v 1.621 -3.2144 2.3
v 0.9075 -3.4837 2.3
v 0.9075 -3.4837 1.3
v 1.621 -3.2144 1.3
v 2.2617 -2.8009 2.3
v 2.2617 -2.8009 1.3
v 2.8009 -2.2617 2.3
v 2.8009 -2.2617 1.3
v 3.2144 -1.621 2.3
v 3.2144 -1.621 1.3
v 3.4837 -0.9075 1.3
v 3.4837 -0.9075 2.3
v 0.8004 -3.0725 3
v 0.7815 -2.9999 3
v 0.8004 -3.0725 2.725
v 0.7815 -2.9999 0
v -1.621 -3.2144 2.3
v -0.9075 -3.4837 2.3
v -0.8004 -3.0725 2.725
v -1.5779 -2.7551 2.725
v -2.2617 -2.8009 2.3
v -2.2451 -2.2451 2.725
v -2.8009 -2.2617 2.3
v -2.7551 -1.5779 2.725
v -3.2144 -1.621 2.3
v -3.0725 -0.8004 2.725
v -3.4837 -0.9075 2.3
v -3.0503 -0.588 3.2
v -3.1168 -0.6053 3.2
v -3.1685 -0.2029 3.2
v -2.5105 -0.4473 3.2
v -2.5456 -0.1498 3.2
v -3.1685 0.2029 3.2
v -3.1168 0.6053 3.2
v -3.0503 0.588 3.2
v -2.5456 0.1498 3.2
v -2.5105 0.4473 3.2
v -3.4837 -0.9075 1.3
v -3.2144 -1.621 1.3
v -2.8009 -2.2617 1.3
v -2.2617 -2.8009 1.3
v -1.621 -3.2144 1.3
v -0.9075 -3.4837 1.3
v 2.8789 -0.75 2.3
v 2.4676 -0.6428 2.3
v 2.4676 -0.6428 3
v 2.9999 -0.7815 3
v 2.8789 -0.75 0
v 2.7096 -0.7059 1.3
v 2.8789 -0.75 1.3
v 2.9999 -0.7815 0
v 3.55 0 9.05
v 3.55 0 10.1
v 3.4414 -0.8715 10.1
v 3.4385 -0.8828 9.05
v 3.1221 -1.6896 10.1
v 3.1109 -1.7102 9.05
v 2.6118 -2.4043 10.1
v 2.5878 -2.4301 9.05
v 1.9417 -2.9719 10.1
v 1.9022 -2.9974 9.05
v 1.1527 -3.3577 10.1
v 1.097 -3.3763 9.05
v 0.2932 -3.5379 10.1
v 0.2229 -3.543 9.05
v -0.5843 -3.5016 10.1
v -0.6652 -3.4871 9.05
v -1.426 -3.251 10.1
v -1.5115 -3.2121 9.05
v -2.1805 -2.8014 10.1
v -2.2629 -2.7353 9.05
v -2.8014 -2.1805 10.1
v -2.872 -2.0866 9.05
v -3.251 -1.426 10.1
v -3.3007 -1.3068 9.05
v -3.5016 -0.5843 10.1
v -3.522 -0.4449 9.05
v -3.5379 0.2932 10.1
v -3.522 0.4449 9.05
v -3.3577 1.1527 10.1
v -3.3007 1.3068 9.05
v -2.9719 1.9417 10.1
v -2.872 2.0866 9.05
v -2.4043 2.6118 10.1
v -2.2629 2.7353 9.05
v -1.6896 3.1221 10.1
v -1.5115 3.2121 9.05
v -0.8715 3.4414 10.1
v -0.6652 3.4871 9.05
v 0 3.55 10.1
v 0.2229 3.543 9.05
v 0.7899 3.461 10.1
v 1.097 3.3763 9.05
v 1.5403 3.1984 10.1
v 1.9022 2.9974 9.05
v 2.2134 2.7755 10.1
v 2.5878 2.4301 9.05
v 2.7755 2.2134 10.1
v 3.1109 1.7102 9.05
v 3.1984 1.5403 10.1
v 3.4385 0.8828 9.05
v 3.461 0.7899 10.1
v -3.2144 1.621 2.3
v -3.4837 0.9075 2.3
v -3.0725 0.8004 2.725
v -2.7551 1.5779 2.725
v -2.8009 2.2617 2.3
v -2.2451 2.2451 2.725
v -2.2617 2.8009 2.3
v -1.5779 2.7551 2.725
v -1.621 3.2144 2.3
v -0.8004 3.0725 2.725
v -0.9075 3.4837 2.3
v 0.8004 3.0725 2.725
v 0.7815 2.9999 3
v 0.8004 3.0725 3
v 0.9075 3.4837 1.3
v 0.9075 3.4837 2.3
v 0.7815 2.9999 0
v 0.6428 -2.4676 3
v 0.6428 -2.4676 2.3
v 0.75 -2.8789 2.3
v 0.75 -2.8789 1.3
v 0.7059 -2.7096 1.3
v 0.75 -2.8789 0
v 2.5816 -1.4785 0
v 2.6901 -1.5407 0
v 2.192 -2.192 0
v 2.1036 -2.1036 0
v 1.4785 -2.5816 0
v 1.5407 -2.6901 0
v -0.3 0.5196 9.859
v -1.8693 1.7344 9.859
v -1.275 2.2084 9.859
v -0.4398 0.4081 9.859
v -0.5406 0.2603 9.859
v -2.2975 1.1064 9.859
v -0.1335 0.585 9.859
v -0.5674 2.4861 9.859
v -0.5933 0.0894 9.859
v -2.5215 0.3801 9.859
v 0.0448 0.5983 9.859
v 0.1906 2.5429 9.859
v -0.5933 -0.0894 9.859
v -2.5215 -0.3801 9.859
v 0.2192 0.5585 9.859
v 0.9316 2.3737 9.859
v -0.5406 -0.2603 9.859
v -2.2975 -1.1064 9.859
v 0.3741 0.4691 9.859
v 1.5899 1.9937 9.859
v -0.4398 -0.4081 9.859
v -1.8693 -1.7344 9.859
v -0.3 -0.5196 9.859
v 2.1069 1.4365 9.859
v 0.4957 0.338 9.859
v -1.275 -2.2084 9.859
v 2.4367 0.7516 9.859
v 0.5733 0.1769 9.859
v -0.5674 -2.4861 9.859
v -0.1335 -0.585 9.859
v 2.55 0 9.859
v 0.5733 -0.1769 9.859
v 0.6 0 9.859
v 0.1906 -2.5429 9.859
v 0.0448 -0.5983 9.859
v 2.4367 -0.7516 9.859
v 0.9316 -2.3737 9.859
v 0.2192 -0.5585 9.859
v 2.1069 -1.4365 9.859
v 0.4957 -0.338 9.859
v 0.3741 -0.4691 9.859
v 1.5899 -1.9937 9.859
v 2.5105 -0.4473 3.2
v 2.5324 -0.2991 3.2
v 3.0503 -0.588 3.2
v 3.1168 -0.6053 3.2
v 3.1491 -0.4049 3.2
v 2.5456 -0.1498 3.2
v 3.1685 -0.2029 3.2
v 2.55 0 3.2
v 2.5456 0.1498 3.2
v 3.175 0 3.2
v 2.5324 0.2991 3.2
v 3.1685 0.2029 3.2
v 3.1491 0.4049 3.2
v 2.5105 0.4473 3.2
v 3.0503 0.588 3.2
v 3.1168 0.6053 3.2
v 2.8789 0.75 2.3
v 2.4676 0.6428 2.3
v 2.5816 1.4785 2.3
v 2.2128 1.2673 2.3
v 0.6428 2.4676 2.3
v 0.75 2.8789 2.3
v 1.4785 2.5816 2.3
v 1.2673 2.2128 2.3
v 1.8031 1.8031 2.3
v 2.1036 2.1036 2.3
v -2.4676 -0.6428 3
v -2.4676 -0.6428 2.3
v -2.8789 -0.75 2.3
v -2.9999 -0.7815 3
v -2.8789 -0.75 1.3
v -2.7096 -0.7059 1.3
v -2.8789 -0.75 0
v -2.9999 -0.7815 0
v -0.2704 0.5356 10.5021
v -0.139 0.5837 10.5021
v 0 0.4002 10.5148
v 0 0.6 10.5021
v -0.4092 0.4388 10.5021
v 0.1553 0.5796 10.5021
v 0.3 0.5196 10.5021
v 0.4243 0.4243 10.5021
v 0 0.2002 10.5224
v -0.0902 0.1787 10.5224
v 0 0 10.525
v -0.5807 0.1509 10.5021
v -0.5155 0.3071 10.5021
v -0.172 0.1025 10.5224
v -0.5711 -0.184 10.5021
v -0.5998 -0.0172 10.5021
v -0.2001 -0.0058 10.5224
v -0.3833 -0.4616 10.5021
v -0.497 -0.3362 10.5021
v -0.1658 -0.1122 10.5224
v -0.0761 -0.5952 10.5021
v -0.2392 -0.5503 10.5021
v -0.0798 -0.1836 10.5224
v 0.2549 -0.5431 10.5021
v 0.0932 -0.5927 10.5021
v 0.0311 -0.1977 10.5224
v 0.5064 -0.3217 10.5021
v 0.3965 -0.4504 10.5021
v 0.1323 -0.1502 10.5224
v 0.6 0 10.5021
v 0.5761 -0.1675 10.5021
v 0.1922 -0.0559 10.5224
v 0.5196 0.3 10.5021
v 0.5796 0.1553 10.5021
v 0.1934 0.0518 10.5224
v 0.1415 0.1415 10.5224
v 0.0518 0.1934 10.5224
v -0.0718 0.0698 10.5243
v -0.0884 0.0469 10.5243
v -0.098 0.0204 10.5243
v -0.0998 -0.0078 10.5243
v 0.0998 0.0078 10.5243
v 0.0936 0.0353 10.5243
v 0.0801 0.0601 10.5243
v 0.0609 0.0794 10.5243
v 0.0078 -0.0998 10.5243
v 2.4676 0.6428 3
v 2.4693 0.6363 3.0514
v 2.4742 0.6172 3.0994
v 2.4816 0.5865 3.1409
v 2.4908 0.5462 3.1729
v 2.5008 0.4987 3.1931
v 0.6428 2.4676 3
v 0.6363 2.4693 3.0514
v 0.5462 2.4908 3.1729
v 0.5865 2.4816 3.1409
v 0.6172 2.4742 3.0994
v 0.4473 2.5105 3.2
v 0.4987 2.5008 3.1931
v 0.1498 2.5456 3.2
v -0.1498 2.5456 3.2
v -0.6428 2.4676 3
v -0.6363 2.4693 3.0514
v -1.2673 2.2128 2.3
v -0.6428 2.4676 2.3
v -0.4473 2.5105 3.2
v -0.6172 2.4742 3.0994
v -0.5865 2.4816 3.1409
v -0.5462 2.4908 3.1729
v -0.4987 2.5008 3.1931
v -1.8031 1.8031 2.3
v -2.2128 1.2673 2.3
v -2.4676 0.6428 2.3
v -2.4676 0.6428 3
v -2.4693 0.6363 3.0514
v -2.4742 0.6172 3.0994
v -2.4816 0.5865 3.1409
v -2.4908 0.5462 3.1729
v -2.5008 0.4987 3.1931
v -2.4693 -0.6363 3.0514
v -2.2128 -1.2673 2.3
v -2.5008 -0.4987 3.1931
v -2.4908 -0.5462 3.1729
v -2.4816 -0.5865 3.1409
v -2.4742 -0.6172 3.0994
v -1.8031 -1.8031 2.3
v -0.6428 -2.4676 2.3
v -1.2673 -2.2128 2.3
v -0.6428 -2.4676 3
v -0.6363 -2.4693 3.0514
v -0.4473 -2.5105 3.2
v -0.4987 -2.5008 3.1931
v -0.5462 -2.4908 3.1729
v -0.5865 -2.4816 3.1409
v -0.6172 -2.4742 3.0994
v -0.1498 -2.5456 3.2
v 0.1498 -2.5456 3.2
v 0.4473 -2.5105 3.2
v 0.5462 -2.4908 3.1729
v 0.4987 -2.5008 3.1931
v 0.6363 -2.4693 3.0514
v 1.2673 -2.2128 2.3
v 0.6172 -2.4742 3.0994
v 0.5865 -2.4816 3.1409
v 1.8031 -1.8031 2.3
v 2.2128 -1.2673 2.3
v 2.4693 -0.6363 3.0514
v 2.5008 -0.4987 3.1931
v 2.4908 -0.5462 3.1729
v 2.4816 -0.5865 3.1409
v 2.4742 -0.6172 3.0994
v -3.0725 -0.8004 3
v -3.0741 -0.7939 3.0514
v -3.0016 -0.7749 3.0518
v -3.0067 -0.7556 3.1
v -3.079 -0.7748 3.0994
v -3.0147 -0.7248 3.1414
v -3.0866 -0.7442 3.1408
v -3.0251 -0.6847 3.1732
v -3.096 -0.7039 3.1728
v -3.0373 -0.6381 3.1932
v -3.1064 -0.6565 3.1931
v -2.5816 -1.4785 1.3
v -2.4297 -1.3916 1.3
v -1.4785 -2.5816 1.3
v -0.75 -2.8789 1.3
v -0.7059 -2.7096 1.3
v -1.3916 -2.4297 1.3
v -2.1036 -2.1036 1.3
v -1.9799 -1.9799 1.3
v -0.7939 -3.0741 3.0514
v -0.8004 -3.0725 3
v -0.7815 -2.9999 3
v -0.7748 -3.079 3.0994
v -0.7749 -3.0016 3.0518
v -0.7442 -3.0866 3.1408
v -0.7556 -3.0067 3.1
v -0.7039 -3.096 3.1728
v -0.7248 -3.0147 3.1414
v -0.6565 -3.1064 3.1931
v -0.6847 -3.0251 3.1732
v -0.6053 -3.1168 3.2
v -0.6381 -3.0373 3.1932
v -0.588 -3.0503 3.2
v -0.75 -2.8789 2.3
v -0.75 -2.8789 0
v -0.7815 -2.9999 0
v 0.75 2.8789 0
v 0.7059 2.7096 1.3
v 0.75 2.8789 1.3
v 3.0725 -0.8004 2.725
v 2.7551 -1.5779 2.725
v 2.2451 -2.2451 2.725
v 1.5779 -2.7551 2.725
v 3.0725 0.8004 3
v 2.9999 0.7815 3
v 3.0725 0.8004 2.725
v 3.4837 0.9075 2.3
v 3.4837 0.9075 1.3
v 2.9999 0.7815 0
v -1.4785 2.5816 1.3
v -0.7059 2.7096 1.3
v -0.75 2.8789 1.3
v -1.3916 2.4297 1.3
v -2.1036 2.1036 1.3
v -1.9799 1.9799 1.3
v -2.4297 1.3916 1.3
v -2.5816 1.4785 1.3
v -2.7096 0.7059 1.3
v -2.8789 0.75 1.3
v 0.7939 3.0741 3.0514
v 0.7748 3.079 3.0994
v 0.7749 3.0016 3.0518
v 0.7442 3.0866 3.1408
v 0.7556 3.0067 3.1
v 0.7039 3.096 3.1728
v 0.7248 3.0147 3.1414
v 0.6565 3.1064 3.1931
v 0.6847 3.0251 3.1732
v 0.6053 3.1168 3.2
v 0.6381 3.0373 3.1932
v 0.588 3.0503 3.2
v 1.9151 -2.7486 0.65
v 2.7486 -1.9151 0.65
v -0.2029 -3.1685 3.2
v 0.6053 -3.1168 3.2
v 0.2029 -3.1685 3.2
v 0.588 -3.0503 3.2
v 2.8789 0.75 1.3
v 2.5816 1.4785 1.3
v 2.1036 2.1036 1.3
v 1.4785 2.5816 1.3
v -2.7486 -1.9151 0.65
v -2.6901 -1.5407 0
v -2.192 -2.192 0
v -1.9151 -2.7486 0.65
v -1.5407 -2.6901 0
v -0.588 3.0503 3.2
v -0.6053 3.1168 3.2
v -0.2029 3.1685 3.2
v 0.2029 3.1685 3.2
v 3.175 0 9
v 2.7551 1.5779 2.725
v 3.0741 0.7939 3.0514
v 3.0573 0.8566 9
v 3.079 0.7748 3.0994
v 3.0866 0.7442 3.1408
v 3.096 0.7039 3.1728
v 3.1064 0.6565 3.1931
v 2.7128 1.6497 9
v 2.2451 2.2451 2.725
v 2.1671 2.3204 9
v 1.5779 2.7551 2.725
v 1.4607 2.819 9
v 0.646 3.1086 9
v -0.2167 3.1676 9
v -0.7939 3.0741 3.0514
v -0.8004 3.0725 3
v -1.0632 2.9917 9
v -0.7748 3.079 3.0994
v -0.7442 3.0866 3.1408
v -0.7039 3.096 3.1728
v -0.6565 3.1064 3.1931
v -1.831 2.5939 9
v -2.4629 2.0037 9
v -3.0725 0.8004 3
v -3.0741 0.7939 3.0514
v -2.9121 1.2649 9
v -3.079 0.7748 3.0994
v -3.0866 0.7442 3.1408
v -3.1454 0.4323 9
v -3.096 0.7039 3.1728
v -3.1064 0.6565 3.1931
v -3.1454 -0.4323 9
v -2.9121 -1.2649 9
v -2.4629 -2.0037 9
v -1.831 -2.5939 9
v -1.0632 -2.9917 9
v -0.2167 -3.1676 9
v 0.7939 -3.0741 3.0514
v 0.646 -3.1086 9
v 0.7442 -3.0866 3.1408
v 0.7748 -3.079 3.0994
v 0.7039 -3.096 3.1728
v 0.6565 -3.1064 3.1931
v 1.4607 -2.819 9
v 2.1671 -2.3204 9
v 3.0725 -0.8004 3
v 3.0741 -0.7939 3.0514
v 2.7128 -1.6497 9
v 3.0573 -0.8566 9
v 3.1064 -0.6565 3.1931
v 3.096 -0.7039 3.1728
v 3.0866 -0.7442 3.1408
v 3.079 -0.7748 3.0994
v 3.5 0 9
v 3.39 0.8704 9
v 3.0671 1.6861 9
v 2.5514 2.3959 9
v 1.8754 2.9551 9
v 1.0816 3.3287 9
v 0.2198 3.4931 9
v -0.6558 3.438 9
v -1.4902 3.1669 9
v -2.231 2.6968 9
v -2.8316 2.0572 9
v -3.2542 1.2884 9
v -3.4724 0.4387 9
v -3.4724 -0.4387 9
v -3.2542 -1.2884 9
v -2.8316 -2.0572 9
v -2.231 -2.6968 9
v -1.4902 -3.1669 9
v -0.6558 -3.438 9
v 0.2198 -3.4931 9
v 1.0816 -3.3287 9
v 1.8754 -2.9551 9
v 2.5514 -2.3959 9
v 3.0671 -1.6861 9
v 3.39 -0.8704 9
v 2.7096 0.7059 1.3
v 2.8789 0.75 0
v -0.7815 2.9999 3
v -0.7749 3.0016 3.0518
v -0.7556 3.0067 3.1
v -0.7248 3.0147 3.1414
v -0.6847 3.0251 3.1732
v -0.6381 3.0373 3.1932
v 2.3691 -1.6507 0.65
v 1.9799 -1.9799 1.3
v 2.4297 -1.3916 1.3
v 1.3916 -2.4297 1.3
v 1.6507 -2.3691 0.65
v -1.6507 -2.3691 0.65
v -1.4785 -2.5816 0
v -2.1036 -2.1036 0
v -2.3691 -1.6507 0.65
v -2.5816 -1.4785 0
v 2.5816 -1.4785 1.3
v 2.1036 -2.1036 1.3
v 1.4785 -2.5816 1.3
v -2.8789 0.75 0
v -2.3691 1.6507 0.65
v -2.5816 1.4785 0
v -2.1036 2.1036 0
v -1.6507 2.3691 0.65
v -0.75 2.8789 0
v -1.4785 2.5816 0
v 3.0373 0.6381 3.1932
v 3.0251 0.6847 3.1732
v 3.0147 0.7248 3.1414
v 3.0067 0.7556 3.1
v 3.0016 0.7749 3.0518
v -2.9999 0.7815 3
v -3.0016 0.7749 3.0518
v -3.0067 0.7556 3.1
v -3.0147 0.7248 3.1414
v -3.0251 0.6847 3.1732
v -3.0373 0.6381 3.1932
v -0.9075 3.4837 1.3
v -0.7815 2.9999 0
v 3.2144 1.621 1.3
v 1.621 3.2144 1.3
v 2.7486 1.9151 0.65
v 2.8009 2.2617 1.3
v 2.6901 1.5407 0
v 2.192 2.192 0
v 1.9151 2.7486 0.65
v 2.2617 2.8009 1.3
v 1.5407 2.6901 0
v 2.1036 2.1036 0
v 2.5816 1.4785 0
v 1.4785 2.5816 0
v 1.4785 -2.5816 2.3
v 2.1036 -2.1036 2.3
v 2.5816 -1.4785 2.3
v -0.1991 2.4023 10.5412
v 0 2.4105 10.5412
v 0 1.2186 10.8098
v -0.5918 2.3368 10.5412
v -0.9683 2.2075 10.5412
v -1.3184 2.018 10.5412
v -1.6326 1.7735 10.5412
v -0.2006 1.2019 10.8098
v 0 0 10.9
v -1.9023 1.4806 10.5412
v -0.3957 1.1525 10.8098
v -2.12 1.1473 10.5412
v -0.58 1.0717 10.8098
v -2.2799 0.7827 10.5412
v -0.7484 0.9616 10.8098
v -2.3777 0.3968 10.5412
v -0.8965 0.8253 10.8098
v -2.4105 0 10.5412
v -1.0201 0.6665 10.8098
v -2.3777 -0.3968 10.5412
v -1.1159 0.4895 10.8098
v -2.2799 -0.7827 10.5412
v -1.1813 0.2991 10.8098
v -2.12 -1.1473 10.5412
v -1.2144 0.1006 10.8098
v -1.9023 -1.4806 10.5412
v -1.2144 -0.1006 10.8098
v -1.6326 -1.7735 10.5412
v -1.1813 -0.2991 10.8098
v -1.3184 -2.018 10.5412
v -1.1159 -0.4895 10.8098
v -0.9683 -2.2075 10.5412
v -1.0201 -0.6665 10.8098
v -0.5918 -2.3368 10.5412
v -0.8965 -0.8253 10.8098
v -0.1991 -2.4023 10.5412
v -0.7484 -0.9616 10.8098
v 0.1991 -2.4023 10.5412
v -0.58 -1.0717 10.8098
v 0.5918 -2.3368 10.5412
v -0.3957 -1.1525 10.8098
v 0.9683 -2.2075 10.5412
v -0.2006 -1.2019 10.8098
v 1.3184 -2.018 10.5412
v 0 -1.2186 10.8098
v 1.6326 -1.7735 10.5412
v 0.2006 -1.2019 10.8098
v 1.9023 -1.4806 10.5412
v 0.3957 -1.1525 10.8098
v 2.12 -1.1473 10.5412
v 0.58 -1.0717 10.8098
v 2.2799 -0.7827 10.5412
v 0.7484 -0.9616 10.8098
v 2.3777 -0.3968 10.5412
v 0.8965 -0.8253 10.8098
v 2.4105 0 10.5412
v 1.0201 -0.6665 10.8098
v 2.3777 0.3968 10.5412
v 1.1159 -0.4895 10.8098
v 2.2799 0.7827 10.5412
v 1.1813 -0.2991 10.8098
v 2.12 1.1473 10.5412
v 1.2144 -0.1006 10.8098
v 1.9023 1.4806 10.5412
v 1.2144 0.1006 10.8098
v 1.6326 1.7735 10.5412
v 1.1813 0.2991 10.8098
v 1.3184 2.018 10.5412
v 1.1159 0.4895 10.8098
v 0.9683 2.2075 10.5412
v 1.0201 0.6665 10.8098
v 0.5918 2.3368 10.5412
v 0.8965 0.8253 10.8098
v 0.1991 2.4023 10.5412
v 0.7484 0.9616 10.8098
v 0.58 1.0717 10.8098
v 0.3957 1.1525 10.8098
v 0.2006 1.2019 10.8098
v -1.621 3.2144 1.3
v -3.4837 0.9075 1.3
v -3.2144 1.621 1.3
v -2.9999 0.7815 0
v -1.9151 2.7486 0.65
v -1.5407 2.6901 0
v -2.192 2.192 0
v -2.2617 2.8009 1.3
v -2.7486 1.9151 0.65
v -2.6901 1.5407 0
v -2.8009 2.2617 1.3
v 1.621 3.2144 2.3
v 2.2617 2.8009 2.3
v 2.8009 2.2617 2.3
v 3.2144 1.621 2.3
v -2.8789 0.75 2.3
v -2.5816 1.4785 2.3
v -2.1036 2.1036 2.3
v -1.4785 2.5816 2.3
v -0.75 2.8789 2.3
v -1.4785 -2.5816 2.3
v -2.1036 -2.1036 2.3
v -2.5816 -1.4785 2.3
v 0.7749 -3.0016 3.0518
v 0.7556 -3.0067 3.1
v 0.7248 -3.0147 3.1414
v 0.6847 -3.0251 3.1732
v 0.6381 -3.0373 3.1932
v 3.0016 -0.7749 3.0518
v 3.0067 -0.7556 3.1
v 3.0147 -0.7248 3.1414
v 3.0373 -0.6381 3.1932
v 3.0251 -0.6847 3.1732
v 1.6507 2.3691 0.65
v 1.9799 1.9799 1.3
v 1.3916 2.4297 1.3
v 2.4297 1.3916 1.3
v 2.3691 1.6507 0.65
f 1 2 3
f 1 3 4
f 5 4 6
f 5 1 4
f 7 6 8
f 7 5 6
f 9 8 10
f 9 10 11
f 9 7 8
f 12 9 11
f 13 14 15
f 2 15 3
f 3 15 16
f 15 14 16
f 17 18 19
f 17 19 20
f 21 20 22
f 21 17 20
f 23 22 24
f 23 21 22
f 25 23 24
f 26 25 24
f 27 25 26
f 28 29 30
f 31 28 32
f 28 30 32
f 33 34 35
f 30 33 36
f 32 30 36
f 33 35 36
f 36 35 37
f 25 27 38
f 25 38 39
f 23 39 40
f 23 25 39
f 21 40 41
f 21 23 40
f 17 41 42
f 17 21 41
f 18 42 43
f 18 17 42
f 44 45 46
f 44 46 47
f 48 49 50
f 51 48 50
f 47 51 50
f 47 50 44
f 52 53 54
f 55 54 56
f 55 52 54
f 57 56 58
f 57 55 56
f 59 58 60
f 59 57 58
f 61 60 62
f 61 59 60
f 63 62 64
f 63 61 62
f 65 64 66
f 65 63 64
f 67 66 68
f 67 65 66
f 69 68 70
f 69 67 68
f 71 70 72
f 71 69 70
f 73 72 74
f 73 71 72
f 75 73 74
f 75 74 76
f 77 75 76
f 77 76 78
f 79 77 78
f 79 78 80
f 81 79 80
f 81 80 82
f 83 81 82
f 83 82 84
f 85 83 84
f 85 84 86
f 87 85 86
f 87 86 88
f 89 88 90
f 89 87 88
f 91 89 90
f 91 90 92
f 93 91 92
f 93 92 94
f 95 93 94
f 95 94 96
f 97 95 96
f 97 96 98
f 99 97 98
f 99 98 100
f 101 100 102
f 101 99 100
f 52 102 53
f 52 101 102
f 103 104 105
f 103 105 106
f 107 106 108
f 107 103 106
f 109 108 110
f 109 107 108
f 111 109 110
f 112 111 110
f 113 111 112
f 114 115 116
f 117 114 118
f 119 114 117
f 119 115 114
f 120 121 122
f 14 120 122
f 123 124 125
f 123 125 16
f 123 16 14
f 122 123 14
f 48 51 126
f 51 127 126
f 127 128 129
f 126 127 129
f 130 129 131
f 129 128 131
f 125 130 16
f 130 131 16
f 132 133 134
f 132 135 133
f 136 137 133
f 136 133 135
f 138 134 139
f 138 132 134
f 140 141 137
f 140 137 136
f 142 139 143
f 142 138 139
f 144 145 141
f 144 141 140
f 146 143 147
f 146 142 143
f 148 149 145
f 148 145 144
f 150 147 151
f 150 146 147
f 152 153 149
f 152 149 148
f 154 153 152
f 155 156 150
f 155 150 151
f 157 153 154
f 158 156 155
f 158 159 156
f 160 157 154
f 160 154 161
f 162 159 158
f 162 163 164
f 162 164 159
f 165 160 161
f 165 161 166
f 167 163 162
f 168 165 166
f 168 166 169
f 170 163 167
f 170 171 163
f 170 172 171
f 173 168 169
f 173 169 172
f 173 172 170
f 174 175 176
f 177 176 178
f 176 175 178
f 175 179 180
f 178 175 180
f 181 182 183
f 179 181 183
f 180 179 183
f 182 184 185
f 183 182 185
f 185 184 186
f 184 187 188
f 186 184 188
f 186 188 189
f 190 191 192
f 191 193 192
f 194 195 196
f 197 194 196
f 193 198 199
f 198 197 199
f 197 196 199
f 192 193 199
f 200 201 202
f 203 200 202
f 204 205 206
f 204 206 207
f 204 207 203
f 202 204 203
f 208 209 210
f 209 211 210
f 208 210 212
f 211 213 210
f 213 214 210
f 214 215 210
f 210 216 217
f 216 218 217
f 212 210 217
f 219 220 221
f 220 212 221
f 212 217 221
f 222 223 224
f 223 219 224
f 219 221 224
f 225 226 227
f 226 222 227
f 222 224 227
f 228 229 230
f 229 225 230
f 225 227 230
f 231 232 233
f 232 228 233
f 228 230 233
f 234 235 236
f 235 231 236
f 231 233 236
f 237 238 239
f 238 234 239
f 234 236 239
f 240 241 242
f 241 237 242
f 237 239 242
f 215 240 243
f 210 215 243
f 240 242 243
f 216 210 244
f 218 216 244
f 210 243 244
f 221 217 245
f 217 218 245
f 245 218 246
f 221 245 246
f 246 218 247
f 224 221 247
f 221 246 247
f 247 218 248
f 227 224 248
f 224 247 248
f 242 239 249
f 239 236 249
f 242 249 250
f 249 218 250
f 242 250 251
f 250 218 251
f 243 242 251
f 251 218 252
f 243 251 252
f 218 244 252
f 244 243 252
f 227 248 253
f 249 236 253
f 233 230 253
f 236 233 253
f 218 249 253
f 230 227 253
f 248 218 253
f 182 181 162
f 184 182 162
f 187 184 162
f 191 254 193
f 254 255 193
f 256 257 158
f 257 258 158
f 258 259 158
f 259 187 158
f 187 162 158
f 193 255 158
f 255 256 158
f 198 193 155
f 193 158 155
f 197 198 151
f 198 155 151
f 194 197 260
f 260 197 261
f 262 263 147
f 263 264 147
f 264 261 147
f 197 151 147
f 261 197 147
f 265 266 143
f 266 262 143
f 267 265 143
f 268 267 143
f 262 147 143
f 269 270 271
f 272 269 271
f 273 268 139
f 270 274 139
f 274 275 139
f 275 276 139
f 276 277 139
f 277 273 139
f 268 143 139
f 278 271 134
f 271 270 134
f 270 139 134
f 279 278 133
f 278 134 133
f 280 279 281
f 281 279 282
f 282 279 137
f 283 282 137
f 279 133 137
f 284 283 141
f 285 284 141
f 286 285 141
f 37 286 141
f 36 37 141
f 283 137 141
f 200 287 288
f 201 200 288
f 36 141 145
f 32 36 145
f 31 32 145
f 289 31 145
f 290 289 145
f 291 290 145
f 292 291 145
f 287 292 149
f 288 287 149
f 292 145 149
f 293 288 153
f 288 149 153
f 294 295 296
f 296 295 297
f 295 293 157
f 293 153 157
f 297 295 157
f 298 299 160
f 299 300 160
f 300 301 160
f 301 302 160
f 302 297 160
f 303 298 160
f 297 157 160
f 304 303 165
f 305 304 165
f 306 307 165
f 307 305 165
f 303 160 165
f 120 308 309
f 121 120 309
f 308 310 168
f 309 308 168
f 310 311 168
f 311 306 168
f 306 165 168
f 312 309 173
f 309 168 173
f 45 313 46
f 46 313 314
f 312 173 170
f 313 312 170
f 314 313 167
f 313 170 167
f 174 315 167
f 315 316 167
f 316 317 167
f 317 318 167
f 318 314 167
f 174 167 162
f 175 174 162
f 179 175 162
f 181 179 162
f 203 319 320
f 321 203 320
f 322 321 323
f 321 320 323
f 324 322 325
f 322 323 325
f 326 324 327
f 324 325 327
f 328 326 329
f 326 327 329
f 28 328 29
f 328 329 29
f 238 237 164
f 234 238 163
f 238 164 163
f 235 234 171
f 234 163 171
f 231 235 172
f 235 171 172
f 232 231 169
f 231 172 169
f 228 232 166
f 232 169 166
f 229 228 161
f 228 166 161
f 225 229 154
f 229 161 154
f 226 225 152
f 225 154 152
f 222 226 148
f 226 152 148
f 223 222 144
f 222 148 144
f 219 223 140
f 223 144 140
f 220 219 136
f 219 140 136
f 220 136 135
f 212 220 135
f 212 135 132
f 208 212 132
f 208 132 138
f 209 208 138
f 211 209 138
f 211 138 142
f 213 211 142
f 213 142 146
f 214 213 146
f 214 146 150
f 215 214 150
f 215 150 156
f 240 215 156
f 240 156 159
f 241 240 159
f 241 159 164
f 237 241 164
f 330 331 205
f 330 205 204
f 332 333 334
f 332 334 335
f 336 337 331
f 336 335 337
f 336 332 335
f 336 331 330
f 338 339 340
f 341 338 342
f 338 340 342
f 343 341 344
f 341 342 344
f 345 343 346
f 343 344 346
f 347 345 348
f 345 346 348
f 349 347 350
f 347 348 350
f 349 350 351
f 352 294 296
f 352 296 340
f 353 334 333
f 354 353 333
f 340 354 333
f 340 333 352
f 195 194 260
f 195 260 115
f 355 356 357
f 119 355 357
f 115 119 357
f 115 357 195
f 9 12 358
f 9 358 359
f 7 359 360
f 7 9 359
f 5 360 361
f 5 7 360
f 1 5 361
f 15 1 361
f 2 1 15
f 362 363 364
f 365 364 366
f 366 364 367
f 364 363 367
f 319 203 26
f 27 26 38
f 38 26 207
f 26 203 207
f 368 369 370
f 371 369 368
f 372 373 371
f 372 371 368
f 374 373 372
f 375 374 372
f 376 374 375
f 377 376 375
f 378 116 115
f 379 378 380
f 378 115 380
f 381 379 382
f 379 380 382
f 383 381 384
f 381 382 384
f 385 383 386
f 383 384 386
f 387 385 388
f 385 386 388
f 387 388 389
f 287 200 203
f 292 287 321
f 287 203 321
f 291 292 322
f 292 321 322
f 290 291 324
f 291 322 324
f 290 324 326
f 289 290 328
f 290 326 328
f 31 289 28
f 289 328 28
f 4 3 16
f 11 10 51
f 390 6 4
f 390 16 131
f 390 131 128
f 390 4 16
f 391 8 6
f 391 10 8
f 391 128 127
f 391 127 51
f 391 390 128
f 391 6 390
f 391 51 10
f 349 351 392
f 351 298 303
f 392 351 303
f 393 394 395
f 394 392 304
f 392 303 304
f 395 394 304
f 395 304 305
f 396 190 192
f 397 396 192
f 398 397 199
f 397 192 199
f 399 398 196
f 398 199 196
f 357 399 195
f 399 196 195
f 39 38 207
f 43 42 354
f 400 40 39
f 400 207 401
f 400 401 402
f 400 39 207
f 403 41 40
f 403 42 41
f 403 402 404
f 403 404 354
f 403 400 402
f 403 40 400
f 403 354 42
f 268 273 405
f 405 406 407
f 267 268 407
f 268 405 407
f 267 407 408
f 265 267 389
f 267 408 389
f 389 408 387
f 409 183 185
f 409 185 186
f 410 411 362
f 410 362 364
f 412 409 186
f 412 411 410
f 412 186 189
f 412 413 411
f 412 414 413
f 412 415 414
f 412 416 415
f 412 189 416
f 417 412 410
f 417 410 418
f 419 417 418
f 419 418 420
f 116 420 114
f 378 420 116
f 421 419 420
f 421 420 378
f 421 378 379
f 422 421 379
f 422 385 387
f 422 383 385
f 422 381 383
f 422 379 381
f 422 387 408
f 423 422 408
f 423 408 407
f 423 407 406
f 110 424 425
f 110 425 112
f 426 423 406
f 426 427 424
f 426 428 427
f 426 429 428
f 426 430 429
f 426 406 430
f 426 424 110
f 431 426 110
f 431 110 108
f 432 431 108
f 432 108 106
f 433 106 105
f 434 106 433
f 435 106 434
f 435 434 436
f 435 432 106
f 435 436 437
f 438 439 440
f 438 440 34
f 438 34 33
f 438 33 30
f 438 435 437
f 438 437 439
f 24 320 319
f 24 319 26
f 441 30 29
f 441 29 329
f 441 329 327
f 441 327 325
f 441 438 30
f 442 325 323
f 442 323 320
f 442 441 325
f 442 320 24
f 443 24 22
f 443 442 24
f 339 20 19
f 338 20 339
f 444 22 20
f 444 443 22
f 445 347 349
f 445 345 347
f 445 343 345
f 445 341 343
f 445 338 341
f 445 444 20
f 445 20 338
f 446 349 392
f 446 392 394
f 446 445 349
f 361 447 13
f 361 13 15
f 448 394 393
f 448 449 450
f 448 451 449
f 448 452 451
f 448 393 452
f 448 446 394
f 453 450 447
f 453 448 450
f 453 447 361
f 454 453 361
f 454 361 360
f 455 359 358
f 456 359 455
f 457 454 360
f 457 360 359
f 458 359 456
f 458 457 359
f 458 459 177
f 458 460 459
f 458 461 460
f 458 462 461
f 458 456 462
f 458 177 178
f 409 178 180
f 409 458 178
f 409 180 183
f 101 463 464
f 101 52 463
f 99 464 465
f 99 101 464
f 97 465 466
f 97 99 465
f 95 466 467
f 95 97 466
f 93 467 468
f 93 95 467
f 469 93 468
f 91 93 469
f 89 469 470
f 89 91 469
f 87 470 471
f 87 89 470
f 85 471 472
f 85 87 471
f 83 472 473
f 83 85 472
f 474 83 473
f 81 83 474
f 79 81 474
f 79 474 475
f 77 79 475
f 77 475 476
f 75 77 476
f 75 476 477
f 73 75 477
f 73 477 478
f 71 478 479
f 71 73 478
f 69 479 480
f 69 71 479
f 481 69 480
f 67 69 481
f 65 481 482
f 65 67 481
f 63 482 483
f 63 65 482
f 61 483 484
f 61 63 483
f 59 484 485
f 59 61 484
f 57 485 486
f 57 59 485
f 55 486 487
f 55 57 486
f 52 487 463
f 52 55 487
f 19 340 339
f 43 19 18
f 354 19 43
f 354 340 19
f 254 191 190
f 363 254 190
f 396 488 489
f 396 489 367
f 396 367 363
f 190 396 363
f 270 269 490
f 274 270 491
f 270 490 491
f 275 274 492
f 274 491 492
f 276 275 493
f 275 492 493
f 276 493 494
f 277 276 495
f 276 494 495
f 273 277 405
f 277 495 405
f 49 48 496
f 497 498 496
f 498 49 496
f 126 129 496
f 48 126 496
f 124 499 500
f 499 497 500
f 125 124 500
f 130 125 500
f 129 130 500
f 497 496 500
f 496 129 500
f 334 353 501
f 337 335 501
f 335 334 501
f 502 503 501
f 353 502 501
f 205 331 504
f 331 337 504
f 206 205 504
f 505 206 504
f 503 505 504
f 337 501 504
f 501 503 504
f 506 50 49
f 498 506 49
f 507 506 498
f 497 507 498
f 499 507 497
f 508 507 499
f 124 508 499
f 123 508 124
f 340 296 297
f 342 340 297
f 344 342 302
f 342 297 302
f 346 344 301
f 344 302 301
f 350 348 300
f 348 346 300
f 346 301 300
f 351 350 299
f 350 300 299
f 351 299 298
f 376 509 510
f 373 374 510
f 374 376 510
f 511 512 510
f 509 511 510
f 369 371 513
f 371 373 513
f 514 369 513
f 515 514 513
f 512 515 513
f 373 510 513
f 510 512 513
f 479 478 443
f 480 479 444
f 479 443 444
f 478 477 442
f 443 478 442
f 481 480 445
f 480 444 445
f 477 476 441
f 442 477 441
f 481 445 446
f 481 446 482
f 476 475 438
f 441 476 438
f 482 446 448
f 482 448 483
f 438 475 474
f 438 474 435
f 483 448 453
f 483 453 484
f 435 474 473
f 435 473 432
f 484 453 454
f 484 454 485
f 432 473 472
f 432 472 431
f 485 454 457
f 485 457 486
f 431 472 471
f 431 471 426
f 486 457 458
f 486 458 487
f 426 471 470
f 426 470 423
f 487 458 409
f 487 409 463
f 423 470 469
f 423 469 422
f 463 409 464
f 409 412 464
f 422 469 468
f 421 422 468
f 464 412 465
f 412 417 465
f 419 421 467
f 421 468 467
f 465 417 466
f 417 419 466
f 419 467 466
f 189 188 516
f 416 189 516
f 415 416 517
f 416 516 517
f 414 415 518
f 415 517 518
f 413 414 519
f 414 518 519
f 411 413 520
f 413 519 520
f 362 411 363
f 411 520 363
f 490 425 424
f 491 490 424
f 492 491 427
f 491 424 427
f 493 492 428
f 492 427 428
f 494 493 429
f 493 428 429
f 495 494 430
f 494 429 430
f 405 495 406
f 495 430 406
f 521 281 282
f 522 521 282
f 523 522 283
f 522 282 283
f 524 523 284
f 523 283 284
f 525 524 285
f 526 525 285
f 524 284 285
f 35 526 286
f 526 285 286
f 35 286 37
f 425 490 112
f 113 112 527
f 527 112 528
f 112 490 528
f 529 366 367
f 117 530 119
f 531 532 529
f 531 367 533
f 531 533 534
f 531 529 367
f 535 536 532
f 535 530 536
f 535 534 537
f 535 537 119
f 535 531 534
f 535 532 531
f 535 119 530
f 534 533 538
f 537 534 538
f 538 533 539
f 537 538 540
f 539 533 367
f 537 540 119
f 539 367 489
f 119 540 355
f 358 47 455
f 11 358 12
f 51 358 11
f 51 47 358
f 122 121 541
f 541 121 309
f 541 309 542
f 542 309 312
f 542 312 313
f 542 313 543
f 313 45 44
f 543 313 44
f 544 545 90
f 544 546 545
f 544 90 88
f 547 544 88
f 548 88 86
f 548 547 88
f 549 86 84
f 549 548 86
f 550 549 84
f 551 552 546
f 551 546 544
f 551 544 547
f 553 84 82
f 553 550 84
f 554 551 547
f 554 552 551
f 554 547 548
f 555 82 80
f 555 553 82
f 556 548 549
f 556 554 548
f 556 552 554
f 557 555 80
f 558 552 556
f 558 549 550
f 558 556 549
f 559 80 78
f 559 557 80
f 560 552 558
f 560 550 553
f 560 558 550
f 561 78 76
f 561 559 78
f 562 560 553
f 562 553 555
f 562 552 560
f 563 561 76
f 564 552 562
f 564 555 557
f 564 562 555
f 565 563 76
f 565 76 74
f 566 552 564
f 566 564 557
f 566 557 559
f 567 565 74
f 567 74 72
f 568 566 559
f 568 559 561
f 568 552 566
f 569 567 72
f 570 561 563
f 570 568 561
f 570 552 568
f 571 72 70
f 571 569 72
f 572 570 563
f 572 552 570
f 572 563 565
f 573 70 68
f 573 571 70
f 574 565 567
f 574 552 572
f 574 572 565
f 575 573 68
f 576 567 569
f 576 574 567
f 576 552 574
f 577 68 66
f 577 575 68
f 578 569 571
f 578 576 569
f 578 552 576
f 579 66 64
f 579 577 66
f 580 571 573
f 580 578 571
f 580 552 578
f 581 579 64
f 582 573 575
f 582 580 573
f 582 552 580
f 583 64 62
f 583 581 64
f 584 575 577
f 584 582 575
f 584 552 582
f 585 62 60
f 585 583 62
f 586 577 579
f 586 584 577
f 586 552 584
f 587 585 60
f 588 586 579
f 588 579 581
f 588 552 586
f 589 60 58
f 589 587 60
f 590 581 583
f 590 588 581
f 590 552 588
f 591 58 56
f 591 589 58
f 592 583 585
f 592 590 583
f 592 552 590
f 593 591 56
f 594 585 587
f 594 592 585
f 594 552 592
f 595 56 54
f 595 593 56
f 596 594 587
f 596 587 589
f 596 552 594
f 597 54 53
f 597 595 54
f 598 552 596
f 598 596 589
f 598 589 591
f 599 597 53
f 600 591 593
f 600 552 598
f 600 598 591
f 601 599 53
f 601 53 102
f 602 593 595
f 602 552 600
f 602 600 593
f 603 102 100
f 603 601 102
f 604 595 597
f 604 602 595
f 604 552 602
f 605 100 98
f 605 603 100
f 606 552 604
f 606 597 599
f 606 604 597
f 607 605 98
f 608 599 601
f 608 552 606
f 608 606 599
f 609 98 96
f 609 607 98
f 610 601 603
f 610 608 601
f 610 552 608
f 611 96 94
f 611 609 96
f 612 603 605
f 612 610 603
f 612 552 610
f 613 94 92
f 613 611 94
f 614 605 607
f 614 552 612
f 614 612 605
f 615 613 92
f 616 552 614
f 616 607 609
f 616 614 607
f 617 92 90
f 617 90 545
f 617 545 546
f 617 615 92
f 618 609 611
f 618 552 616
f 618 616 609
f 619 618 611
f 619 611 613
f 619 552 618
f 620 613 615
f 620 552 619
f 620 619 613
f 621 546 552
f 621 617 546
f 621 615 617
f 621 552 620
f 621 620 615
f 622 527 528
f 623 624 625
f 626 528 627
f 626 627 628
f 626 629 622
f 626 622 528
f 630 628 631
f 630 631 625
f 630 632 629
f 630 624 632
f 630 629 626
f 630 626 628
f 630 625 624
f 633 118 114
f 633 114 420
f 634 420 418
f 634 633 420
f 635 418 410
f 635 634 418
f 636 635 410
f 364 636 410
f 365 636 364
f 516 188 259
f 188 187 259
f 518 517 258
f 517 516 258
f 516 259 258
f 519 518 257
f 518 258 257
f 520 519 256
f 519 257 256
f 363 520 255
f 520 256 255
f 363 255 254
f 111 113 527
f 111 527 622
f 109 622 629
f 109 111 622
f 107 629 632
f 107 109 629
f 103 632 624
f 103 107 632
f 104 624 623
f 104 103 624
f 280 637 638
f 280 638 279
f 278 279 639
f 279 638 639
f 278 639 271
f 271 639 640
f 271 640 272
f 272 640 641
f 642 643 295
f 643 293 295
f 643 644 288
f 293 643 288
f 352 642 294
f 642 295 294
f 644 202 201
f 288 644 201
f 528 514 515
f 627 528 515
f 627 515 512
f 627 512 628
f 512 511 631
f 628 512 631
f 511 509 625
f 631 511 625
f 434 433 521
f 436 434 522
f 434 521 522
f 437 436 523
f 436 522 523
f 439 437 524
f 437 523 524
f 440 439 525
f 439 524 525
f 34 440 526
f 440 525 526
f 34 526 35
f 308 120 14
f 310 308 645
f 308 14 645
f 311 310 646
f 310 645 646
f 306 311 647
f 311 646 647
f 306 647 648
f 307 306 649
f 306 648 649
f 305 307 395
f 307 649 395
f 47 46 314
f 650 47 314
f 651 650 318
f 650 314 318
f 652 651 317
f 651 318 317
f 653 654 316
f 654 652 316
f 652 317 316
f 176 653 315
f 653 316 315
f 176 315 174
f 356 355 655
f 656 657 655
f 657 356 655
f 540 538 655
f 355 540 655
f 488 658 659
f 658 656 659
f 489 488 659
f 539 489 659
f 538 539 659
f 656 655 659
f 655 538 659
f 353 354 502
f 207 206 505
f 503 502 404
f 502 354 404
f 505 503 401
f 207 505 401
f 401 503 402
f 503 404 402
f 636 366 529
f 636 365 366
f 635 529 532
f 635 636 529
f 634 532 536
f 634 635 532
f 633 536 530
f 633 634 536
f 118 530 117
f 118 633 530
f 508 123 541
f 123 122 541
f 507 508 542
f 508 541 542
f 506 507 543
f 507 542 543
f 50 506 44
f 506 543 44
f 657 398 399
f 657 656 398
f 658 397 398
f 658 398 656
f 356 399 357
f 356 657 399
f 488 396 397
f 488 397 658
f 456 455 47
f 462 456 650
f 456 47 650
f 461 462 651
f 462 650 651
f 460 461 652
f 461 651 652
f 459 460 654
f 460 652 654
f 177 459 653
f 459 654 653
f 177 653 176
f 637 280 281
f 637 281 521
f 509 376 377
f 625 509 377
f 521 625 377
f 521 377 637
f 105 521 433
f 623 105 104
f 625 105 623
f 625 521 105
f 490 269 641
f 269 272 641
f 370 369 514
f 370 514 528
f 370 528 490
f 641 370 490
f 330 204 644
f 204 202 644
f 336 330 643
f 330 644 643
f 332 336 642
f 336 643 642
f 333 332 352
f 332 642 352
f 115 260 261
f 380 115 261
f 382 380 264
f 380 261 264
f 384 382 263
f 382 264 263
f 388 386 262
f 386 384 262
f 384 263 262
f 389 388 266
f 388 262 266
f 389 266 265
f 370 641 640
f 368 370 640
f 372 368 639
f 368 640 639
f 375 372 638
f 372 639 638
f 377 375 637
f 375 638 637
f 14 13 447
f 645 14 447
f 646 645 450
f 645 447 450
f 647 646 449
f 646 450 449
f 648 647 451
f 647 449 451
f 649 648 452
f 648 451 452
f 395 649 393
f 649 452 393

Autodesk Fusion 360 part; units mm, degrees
ref_plane "WorkPlane1" through (0, 0, 9) normal (0, 0, 1) x (1, 0, 0)
sketch "Sketch2" plane through (0, 0, 9) normal (0, 0, 1) x (1, 0, 0)
  circle A0 centre (0, 0) radius 3.55
  circle A1 centre (0, 0) radius 3.175
  circle A2 centre (0, 0) radius 2.55
  dimension "d2" = 7.1
  dimension "d3" = 6.35
  dimension "d25" = 5.1
extrude "Extrude1" add sketch "Sketch2" along normal blind 1.1 contours A0
sketch "Sketch4" plane through (0, 0, 0) normal (1, 0, 0) x (0, 1, 0)
  line L0 (0, 10.1) -> (0, 10.9) construction
  arc A0 (3.55, 10.1) -> (-3.55, 10.1) centre (0, 2.6234) ccw
  arc A1 (3.175, 9.859) -> (-3.3892, 9.7612) centre (0, 2.6234) ccw
  line L1 (-3.175, 10.1) -> (3.175, 10.1) construction
  line L2 (3.175, 10.1) -> (3.175, 9.859)
  line L3 (0, 10.9) -> (0, 10.525)
  line L4 (3.175, 10.1) -> (3.55, 10.1)
  dimension "d8" = 0.8
revolve "Revolve1" add sketch "Sketch4" angle 360 about axis through (0, 0, 10.1) along (0, 0, 1)
extrude "Extrude6" add sketch "Sketch2" along normal up to surface contours A1 end surface at (-0.7353, 2.2055, 10.1753)
ref_plane "WorkPlane2" through (0, 0, 9.859) normal (0, 0, -1) x (-1, 0, 0)
sketch "Sketch5" plane through (0, 0, 9.859) normal (0, 0, -1) x (1, 0, 0)
  circle A0 centre (0, 0) radius 3.175
  circle A1 centre (0, 0) radius 2.1
  circle A2 centre (0, 0) radius 1.1
  circle A3 centre (0, 0) radius 0.6
  dimension "d11" = 4.2
  dimension "d12" = 2.2
  dimension "d13" = 1.2
extrude "Extrude3" add sketch "Sketch5" along normal up to surface contours A0 end surface at (-0.5875, 1.7623, 10.3035)
extrude "Extrude4" add sketch "Sketch5" along normal up to surface and the other way blind 0.2 contours A1 end surface at (-0.4825, 1.4472, 10.3763)
extrude "Extrude5" add sketch "Sketch5" along normal up to surface and the other way blind 0.4 contours A2 end surface at (-0.252, 0.4204, 10.5098)
ref_plane "WorkPlane3" through (0, 0, 2.3) normal (0, 0, -1) x (-1, 0, 0)
extrude "Extrude7" add sketch "Sketch2" against normal up to surface (6.7 mm away) contours A1
sketch "Sketch7" plane through (0, 0, 0) normal (0, 1, 0) x (1, 0, 0)
  line L0 (0, 0) -> (-2.975, 0) construction
  line L1 (0, 0) -> (-2.8, 0) construction
  line L2 (0, 0) -> (-3.1, 0) construction
  line L3 (0, 0) -> (-3.6, 0) construction
  line L4 (-2.8, 0) -> (-2.8, -1.3) construction
  line L5 (-2.8, -1.3) -> (-2.975, 0)
  line L6 (-2.975, 0) -> (-3.1, 0)
  line L7 (-2.975, 0) -> (-2.975, -1.3) construction
  line L8 (-2.975, -1.3) -> (-2.8, -1.3)
  line L9 (-3.6, 0) -> (-3.6, -1.3) construction
  line L10 (-3.1, 0) -> (-3.6, -1.3)
  line L11 (-3.175, -2.3) -> (3.175, -2.3)
  line L12 (0, -2.3) -> (-2.55, -2.3) construction
  line L13 (-2.975, -1.3) -> (-2.975, -2.3)
  line L14 (-3.175, -2.3) -> (-3.6677, -2.3) construction
  line L15 (-3.6, -1.3) -> (-3.6, -2.3)
  line L16 (-3.6, -2.3) -> (-3.175, -2.725)
  line L17 (-3.175, -2.3) -> (3.175, -2.3)
  line L18 (-3.55, -9) -> (-3.175, -9)
  line L19 (3.175, -9) -> (3.55, -9)
  line L20 (3.175, -9) -> (3.175, -2.3)
  line L21 (-3.175, -9) -> (-3.175, -2.3)
  arc A0 (-3.55, -10.1) -> (3.55, -10.1) centre (0, -2.6234) ccw
  line L22 (-3.55, -9) -> (-3.55, -10.1)
  line L23 (3.55, -9) -> (3.55, -10.1)
  line L24 (0, 0) -> (0, -2.3) construction
  dimension "d31" = 2.975
  dimension "d32" = 2.8
  dimension "d33" = 3.1
  dimension "d34" = 3.6
  dimension "d35" = 1.3
  dimension "d36" = 2.55
revolve "Revolve2" add sketch "Sketch7" angle 360 about axis through (0, 0, 0) along (0, 0, 1) contours L5 L6 L8 L10 L11 L13 L15 L16 L17 L21
sketch "Sketch8" plane through (0, 0, 0) normal (0, 0, 1) x (1, 0, 0)
  circle A0 centre (0, 0) radius 3.1
  circle A1 centre (0, 0) radius 2.975
  line L0 (0, 0) -> (4.4217, 0) construction
  line L1 (0, 0) -> (2.9999, -0.7815)
  line L2 (2.8789, -0.75) -> (2.8789, 0)
  line L3 (2.9999, -0.7815) -> (4.4217, -1.1519)
  line L4 (4.4217, -1.1519) -> (4.4217, 0)
  line L5 (0, 0) -> (2.9999, 0.7815)
  line L6 (2.9999, 0.7815) -> (4.4217, 1.1519)
  line L7 (4.4217, 1.1519) -> (4.4217, 0)
  line L8 (0, 0) -> (0, -1.5) construction
  line L9 (0, 0) -> (-2.9999, -0.7815)
  line L10 (0, 0) -> (-2.9999, 0.7815)
  line L11 (-2.9999, 0.7815) -> (-4.4217, 1.1519)
  line L12 (-4.4217, 1.1519) -> (-4.4217, 0)
  line L13 (-4.4217, -1.1519) -> (-4.4217, 0)
  line L14 (-2.9999, -0.7815) -> (-4.4217, -1.1519)
  line L15 (-1.1519, -4.4217) -> (0, -4.4217)
  line L16 (0.7815, -2.9999) -> (1.1519, -4.4217)
  line L17 (1.1519, -4.4217) -> (0, -4.4217)
  line L18 (-0.7815, -2.9999) -> (-1.1519, -4.4217)
  line L19 (0, 0) -> (-0.7815, -2.9999)
  line L20 (0, 0) -> (0.7815, -2.9999)
  line L21 (0, 0) -> (0.7815, 2.9999)
  line L22 (0, 0) -> (-0.7815, 2.9999)
  line L23 (0.7815, 2.9999) -> (1.1519, 4.4217)
  line L24 (1.1519, 4.4217) -> (0, 4.4217)
  line L25 (-1.1519, 4.4217) -> (0, 4.4217)
  line L26 (-0.7815, 2.9999) -> (-1.1519, 4.4217)
  dimension "d38" = 0.75
extrude "Extrude8" cut sketch "Sketch8" along normal blind 3.2 contours A0 A1 L1 L5 | A0 L3 L4 L6 L7 | A0 A1 L21 L22 | A0 L23 L24 L25 L26 | A1 L1 L5 | A0 L15 L16 L17 L18 | A0 A1 L19 L20 | A1 L21 L22 | A1 L9 L10 | A1 L19 L20 | A0 A1 L9 L10 | A0 L11 L12 L13 L14
fillet "Fillet1" radius 0.2 8 edges at (-0.7216, 2.77, 3.2) (0.7216, 2.77, 3.2) (-2.77, 0.7216, 3.2) (-2.77, -0.7216, 3.2) (0.7216, -2.77, 3.2) (-0.7216, -2.77, 3.2) (2.77, 0.7216, 3.2) (2.77, -0.7216, 3.2)
chamfer "Chamfer1" distance 0.05 angle 45 1 edges at (-3.3098, -1.2837, 9)
equation "d31 = ( ( 5.8 / 2 ) * 1 mm ) + 0.7 mm - 0.625 mm"
equation "d32 = ( 5.6 / 2 ) * 1 mm"
equation "d33 = 2.9 mm + 0.2 mm"
equation "d34 = d31 + 0.625 mm"
equation "d36 = ( 5.1 / 2 ) * 1 mm"
equation "d38 = ( 1.5 / 2 ) * 1 mm"
